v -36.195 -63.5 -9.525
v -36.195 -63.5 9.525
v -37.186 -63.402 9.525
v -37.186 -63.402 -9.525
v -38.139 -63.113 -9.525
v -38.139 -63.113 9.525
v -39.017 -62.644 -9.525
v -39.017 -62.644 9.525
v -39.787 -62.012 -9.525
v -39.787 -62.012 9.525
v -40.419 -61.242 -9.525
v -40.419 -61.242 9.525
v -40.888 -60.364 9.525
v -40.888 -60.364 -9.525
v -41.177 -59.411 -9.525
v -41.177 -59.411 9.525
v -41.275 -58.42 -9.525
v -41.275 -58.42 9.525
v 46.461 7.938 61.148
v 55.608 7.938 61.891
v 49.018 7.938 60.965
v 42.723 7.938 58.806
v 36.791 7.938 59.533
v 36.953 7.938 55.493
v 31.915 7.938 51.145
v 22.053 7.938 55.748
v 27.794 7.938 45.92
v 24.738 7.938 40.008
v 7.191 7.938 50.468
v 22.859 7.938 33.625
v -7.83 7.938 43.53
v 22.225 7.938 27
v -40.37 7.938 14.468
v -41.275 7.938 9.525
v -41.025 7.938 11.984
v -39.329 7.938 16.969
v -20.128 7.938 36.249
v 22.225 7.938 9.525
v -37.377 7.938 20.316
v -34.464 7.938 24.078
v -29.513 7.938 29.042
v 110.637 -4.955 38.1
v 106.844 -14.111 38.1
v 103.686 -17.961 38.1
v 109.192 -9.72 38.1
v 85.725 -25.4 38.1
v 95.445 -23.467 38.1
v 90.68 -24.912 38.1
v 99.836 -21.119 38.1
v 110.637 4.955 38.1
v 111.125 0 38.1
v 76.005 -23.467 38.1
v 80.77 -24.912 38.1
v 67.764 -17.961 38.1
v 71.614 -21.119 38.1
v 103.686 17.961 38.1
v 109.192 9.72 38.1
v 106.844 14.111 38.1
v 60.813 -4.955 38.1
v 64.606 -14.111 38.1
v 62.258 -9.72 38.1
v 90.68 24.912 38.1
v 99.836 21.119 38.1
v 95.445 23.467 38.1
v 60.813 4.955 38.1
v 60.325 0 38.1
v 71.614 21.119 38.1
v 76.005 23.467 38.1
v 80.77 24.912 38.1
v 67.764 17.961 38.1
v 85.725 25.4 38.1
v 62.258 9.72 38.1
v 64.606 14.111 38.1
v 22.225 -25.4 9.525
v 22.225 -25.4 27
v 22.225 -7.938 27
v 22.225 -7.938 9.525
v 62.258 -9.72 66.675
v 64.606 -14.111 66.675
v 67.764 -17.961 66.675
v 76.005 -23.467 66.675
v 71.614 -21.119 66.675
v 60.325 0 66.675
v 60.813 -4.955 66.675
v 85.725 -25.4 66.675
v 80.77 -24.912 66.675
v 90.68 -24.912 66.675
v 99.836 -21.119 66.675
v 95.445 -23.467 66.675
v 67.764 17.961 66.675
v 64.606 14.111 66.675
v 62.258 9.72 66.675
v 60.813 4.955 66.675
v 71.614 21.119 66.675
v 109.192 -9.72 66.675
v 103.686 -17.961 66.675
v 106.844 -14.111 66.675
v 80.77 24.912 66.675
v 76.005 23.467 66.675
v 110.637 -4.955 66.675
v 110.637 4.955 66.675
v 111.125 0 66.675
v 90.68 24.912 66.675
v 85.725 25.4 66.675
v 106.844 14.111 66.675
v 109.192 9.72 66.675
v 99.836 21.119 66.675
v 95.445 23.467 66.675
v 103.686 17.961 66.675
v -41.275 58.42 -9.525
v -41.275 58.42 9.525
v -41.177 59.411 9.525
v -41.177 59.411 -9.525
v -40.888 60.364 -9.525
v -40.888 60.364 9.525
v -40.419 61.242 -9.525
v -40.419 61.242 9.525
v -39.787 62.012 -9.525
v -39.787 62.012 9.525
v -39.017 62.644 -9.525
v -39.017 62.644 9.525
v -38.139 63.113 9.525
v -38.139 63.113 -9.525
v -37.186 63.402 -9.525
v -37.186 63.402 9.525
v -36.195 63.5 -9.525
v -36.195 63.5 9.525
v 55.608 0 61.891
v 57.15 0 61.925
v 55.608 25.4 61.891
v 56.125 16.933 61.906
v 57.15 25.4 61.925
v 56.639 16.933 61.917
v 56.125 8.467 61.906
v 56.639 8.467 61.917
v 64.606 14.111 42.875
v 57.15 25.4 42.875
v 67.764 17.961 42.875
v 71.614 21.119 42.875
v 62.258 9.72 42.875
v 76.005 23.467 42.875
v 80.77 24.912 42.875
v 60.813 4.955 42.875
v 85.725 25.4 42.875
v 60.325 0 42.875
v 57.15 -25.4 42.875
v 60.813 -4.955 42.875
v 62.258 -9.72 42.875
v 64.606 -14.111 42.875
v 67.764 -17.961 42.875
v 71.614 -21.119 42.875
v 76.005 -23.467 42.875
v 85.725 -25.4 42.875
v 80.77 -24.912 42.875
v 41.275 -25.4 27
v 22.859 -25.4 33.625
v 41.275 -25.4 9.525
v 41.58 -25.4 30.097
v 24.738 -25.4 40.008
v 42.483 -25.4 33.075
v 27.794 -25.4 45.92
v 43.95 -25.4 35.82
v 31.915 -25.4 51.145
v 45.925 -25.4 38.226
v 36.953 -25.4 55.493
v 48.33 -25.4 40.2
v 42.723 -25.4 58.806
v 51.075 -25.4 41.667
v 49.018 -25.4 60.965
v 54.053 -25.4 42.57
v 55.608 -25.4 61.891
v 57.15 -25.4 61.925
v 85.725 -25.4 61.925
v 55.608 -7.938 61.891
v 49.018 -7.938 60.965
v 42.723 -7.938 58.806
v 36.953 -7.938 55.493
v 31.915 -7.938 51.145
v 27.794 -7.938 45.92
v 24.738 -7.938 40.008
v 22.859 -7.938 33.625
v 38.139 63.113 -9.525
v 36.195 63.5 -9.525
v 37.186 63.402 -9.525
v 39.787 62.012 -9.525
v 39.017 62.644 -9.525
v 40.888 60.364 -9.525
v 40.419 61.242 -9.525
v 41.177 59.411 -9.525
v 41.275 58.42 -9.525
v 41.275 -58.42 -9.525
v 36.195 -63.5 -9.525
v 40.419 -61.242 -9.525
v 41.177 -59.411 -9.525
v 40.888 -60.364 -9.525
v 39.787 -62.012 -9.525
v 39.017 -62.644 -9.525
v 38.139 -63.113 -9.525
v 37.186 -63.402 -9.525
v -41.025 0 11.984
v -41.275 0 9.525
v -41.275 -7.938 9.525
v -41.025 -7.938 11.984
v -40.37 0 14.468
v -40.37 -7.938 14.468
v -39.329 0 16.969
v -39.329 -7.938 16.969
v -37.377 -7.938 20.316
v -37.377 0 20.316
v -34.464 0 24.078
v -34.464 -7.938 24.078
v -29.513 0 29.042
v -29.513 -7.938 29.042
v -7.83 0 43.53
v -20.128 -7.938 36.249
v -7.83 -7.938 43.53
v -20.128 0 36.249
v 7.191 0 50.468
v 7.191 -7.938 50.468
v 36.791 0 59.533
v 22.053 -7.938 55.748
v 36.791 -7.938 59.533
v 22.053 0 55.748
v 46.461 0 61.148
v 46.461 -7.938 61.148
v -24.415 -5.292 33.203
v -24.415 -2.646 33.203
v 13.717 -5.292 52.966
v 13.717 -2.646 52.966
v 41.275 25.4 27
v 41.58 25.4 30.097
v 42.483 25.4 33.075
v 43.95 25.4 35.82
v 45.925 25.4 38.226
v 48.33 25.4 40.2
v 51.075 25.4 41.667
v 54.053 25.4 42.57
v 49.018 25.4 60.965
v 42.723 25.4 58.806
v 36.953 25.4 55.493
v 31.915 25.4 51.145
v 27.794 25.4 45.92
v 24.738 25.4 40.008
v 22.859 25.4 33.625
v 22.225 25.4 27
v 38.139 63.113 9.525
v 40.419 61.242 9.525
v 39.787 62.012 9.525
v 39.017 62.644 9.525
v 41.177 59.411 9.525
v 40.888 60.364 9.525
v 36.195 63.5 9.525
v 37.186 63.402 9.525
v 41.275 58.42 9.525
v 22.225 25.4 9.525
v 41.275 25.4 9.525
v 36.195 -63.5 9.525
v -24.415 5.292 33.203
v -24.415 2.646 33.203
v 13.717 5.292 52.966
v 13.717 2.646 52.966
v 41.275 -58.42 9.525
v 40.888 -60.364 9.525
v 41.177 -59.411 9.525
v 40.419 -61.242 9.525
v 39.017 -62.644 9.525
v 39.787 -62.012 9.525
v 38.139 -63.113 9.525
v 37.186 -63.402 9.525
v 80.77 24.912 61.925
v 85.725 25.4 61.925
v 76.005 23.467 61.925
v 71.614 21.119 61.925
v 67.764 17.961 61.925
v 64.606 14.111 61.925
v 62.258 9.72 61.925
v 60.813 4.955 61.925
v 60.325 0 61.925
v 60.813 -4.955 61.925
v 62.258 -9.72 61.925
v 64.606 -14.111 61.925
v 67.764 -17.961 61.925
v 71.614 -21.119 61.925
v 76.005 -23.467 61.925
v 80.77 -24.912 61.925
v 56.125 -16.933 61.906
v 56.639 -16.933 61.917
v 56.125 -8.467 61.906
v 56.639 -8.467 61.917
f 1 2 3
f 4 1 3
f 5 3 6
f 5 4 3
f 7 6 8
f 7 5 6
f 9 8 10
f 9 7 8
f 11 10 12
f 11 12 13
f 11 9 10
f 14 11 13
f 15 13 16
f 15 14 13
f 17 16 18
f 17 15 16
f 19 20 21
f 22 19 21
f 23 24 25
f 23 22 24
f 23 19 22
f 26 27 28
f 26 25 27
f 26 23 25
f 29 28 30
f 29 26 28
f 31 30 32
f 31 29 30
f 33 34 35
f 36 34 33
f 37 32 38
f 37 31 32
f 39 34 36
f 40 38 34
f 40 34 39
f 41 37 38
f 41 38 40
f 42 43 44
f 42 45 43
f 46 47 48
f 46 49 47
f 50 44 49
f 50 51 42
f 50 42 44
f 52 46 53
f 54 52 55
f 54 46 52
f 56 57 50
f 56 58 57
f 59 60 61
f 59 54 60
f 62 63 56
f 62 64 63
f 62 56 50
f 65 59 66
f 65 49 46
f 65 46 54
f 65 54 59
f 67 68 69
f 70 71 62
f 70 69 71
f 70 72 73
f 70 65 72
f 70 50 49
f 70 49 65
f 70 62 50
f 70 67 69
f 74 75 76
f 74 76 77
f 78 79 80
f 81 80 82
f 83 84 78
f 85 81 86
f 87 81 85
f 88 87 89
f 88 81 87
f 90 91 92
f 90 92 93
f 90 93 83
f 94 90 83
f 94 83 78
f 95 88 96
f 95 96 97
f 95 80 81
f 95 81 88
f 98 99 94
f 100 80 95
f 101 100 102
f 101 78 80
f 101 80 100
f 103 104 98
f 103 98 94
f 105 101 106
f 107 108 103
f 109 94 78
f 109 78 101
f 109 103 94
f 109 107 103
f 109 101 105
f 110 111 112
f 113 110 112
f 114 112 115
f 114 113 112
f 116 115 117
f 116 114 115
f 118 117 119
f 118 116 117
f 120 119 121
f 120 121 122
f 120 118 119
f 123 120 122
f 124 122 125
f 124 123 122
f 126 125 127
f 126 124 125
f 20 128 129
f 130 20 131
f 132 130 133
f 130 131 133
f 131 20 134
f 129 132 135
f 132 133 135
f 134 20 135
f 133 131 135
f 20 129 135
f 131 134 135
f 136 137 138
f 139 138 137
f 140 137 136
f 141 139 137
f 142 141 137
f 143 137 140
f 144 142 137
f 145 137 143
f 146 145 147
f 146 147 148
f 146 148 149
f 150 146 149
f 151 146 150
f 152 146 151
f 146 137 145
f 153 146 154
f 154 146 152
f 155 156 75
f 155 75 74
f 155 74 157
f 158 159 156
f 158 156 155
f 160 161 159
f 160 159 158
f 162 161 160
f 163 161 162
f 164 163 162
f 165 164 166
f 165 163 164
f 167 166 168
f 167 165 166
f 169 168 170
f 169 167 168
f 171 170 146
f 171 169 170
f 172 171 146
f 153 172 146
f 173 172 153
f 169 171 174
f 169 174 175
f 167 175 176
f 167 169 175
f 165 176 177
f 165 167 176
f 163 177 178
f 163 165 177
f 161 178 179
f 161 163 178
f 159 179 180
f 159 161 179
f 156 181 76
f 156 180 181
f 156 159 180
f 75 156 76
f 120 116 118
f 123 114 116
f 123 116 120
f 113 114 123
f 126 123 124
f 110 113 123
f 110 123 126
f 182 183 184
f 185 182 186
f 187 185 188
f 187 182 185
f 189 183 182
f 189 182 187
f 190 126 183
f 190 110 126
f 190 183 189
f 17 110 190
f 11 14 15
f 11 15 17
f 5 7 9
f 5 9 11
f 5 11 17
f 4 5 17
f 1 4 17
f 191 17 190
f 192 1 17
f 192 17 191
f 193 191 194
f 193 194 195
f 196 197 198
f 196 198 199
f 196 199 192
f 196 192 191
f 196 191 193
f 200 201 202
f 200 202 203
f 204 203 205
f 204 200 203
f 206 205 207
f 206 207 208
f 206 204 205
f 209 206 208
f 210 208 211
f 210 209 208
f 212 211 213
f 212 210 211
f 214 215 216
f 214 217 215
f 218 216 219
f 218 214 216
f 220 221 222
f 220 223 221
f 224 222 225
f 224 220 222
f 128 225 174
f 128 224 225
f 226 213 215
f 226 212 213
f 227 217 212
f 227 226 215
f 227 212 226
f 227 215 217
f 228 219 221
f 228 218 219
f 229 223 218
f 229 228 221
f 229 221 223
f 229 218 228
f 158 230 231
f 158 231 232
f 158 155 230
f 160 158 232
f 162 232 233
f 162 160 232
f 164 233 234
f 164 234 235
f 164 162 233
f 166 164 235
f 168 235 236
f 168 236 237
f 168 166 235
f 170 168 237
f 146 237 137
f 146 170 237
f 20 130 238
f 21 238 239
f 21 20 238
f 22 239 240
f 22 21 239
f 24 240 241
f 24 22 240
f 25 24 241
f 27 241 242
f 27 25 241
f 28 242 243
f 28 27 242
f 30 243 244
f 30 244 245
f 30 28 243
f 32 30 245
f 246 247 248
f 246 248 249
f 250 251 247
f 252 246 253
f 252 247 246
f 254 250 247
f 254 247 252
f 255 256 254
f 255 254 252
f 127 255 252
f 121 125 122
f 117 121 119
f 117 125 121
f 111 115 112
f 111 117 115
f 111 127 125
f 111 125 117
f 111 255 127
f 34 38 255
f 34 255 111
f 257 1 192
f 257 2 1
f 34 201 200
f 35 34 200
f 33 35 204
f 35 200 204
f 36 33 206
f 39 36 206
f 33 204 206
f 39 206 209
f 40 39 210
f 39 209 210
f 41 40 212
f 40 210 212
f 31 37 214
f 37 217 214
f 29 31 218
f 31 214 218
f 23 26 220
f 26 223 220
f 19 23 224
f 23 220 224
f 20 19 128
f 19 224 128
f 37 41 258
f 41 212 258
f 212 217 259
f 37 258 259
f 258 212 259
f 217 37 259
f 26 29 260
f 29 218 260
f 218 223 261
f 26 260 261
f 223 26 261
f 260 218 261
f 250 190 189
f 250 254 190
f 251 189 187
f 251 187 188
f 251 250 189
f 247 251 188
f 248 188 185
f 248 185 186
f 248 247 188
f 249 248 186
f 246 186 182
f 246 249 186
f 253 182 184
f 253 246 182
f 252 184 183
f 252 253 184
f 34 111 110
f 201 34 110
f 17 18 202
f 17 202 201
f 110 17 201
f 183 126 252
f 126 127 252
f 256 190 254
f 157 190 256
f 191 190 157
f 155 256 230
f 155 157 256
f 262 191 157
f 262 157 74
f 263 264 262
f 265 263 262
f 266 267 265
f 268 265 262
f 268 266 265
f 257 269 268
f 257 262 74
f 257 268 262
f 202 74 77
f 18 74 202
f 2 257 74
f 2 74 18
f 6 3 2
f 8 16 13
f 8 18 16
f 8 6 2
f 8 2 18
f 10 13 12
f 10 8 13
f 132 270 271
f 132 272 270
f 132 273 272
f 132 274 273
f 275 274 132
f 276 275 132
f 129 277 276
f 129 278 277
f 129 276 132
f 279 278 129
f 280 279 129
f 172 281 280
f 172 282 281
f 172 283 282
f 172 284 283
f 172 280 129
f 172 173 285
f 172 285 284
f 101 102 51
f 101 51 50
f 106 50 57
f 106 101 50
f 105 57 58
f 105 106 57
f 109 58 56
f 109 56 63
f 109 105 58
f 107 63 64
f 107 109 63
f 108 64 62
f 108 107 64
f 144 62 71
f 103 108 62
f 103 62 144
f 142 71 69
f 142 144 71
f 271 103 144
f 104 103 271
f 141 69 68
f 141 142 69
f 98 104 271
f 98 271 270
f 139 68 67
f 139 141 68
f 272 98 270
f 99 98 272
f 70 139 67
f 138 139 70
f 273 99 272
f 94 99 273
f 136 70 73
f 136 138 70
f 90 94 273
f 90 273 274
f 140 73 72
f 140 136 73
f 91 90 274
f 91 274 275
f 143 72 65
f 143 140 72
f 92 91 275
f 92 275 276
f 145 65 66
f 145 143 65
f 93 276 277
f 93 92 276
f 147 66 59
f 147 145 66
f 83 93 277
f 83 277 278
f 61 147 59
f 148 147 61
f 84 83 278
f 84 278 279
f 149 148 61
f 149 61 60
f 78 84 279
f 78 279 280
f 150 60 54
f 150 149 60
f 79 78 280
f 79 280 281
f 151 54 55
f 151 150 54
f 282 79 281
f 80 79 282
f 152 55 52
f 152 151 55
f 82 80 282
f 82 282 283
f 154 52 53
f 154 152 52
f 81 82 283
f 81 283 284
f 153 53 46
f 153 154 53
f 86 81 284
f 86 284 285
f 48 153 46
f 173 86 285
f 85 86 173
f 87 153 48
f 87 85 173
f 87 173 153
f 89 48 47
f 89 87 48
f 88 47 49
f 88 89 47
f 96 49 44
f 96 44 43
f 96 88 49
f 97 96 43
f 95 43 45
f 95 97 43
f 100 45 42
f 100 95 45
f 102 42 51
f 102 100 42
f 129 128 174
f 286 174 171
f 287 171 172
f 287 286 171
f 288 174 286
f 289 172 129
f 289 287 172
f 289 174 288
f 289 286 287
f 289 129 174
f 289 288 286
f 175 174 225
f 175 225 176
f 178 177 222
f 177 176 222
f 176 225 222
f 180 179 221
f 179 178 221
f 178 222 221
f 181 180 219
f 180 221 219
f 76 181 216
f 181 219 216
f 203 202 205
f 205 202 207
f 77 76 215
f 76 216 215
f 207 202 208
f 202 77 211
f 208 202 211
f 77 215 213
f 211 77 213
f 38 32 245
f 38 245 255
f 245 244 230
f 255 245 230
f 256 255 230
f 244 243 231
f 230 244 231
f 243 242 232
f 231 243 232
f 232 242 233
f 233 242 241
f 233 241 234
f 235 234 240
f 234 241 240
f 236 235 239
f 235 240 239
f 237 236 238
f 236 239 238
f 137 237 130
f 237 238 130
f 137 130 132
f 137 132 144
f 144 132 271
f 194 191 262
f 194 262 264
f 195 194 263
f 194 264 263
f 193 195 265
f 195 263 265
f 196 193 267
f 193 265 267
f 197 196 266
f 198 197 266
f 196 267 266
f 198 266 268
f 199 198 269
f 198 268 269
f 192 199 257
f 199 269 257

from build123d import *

# Parameters (mm, degrees)
F1_DEPTH = 63.5
F0_W     = 25.4
F0_H     = 19.05
F2_DEPTH = 25.4
F3_DEPTH = 7.9375
F5_R     = 5.08


with BuildPart() as f1:
    # F0 (on Front) → F1 (new body, symmetric)
    with BuildSketch(Plane.XZ):
        Polygon((-41.275, 9.525), (-41.275, -9.525), (41.275, -9.525), (41.275, 9.525), (22.225, 9.525), align=None)
    extrude(amount=F1_DEPTH, both=True)

    # F0 (on Front) → F2 (join, symmetric)
    with BuildSketch(Plane.XZ):
        with Locations((73.025, 52.4002)):
            Rectangle(F0_W, F0_H)
        with BuildLine():
            Line((22.225, 9.525), (41.275, 9.525))
            Line((41.275, 9.525), (41.275, 27.0002))
            ThreePointArc((41.275, 27.0002), (45.9246798487, 38.2255201513), (57.15, 42.8752))
            Line((57.15, 42.8752), (60.325, 42.8752))
            Line((60.325, 42.8752), (60.325, 61.9252))
            Line((60.325, 61.9252), (57.15, 61.9252))
            add(Edge.make_bspline(
                [(55.6078581678, 61.8911361234), (56.1258190219, 61.9074850682), (56.63993318, 61.918866137), (57.15, 61.9252)],
                knots=[110.0024937652, 110.0024937652, 110.0024937652, 110.0024937652, 111.5045361635, 111.5045361635, 111.5045361635, 111.5045361635], degree=3))
            ThreePointArc((55.6078581678, 61.8911361234), (31.9149556322, 51.1445194304), (22.225, 27.0002))
            Line((22.225, 27.0002), (22.225, 9.525))
        make_face()
    extrude(amount=F2_DEPTH, both=True)

    # F0 (on Front) → F3 (join, symmetric)
    with BuildSketch(Plane.XZ):
        with BuildLine():
            add(Edge.make_bspline(
                [(-41.275, 9.525), (-40.8895493479, 32.8517610266), (17.6748506275, 60.6938165945), (55.6078581678, 61.8911361234)],
                knots=[0, 0, 0, 0, 110.0024937652, 110.0024937652, 110.0024937652, 110.0024937652], degree=3))
            Line((-41.275, 9.525), (22.225, 9.525))
            Line((22.225, 9.525), (22.225, 27.0002))
            ThreePointArc((22.225, 27.0002), (31.9149556322, 51.1445194304), (55.6078581678, 61.8911361234))
        make_face()
    extrude(amount=F3_DEPTH, both=True)

    # F0 (on Front) → F4 (revolve)
    with BuildSketch(Plane.XZ):
        Polygon((85.725, 66.675), (85.725, 61.9252), (85.725, 42.8752), (85.725, 38.1), (111.125, 38.1), (111.125, 66.675), align=None)
    revolve(axis=Axis((85.725, 0, 52.3875), (0, 0, 1)))

    # F5
    f5_edges = [f1.edges().sort_by_distance(p)[0] for p in [
        (41.275, -63.5, 0),
        (-41.275, -63.5, 0),
        (-41.275, 63.5, 0),
        (41.275, 63.5, 0),
    ]]
    fillet(f5_edges, radius=F5_R)


solid = f1.part
